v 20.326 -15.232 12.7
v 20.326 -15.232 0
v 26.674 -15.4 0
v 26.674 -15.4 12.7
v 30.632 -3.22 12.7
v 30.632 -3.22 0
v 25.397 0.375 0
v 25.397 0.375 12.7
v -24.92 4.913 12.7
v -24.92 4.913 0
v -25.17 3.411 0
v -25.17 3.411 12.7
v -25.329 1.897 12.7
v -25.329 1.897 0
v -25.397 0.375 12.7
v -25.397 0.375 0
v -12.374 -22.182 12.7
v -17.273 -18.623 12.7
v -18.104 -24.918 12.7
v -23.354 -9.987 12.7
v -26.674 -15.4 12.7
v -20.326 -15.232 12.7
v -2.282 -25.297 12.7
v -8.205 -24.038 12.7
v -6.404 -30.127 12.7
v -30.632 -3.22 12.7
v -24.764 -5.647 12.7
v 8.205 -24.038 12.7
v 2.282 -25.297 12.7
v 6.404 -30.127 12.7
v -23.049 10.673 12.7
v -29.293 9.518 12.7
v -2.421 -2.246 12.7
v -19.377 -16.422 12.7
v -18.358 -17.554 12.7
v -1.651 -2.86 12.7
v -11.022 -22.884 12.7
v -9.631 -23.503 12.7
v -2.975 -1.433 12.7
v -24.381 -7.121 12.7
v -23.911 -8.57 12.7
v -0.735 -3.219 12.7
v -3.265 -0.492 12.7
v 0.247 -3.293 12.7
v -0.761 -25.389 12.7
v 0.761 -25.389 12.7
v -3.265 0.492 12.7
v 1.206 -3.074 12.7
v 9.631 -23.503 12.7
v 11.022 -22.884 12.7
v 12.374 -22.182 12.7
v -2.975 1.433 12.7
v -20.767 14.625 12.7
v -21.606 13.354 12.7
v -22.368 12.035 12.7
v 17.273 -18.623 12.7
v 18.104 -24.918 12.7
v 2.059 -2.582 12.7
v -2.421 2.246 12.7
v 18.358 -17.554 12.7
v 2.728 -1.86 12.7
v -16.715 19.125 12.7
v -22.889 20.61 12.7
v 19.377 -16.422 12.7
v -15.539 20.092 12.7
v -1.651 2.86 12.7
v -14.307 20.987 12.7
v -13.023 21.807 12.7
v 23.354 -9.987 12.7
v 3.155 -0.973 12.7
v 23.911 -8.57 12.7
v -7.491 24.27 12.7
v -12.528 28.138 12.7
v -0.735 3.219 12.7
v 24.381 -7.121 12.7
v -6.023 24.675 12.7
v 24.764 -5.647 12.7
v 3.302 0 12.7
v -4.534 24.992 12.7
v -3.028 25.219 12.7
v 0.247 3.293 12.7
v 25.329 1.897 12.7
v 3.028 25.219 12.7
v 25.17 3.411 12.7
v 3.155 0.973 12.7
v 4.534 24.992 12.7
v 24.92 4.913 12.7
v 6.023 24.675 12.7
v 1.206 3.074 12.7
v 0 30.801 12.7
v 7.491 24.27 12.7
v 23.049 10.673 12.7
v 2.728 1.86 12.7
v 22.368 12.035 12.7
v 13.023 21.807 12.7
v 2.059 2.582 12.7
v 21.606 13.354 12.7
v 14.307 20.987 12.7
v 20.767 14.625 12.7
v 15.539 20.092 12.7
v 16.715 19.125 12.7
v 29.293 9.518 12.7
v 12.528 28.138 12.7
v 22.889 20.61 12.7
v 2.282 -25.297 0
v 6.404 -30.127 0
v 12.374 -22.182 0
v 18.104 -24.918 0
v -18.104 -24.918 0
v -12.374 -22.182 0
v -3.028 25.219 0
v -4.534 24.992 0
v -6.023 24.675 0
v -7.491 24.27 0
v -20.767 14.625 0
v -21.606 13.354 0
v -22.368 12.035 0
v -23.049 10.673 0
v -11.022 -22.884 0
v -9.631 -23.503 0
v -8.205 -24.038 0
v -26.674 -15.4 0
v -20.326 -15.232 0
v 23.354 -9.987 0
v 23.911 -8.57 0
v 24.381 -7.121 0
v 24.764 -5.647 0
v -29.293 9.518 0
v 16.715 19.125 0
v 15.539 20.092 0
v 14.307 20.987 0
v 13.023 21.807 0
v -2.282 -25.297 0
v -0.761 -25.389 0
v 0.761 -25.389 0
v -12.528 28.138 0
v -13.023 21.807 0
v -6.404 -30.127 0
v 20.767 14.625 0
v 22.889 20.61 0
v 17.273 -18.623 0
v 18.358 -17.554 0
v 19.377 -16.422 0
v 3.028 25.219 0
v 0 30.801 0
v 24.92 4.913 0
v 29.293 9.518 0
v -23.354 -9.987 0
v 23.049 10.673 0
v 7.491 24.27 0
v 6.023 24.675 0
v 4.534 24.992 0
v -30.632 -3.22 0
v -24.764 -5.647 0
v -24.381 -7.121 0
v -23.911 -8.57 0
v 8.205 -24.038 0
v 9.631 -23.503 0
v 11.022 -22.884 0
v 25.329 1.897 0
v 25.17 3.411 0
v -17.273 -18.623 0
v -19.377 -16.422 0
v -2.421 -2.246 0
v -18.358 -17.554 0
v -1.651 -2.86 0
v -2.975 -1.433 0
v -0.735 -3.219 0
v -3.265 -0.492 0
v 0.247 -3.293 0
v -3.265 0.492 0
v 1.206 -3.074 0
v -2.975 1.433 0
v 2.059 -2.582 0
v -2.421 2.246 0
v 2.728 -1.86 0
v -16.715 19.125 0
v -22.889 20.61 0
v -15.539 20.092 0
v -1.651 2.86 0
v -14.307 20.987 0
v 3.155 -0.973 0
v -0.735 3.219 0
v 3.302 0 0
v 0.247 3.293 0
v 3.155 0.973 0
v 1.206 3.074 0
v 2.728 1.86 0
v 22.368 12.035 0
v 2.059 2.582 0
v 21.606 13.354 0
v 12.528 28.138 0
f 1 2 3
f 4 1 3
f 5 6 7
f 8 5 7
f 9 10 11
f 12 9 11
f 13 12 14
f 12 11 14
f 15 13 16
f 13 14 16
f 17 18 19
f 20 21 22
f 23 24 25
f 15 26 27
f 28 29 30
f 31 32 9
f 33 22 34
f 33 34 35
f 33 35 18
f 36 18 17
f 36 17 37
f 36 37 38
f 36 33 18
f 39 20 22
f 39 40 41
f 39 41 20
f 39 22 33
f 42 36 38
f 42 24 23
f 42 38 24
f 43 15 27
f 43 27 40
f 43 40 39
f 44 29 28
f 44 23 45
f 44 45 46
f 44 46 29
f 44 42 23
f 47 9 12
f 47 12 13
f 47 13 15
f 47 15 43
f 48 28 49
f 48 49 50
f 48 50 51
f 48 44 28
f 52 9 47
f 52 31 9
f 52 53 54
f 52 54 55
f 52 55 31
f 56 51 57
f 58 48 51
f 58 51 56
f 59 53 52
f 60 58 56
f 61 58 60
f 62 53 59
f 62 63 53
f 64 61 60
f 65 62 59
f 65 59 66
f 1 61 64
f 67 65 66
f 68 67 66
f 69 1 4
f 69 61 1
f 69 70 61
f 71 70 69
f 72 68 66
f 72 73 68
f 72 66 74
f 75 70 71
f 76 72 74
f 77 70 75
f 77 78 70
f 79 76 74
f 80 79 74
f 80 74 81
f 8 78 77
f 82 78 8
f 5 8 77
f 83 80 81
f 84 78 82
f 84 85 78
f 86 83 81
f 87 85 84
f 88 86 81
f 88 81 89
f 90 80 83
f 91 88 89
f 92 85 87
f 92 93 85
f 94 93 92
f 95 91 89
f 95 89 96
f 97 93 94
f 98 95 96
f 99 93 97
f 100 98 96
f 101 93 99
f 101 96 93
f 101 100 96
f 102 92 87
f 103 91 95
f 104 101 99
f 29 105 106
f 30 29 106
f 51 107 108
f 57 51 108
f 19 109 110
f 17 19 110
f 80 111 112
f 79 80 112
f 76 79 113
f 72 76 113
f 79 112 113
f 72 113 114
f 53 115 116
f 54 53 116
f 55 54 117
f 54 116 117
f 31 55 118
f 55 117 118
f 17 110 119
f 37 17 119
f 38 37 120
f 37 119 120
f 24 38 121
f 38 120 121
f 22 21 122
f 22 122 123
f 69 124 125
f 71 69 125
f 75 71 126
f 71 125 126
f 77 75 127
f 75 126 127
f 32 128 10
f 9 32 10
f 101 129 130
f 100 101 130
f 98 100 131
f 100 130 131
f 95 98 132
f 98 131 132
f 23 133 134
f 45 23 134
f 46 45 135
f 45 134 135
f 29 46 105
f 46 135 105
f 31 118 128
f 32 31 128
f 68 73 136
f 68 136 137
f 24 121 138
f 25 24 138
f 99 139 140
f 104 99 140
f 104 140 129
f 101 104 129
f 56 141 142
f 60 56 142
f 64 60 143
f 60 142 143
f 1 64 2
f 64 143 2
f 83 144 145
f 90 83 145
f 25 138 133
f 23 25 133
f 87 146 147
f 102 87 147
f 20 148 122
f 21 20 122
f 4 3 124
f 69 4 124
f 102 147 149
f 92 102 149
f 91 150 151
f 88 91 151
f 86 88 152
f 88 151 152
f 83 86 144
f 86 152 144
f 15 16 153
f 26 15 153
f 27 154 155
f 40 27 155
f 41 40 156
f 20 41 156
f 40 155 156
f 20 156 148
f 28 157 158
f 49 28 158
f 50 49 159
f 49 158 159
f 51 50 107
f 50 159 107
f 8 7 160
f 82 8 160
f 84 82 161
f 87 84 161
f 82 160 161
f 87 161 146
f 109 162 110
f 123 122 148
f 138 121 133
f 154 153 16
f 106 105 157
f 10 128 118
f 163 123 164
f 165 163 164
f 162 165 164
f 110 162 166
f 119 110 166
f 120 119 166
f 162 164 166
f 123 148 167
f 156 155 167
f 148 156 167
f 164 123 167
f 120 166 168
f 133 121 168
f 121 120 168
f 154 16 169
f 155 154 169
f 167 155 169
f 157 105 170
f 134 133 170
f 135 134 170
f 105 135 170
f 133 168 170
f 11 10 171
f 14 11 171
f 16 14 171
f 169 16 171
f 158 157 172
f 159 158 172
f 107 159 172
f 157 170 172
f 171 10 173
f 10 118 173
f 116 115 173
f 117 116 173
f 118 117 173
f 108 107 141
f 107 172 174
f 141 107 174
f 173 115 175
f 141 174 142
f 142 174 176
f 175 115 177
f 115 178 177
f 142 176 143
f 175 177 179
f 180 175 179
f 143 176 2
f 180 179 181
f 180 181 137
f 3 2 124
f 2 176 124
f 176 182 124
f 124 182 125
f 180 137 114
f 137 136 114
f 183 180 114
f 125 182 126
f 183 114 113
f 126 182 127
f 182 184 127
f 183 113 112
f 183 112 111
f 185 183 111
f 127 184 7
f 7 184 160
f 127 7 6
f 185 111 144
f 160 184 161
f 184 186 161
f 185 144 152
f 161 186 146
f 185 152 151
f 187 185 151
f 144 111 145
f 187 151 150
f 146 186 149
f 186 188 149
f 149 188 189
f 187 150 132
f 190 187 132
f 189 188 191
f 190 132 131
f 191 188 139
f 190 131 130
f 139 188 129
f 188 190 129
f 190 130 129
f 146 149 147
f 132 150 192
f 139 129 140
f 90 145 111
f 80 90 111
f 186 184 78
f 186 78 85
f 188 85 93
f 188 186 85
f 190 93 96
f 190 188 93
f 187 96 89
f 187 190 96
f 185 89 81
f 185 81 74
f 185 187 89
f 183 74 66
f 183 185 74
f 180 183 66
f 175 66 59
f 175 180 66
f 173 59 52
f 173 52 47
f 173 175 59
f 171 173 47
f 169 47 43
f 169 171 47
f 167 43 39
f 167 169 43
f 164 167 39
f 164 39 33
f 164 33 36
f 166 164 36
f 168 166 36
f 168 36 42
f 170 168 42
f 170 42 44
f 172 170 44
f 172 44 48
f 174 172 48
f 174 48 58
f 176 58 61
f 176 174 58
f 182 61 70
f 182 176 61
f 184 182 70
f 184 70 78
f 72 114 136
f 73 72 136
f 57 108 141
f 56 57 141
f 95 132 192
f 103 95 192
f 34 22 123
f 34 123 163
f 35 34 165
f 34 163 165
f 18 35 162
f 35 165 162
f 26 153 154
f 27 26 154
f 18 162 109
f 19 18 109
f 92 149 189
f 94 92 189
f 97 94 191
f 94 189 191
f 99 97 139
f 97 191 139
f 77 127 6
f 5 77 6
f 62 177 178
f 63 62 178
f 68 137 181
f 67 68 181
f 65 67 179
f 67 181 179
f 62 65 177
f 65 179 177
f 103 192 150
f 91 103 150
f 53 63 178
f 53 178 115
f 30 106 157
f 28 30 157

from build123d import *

# Parameters (mm, degrees)
F0_R     = 3.302
F1_DEPTH = 12.7


with BuildPart() as f1:
    # F0 (on Top) → F1 (new body)
    with BuildSketch(Plane.XY):
        with BuildLine():
            ThreePointArc((24.764251, -5.647288), (25.240562, -2.84148), (25.4, 0))
            ThreePointArc((25.4, 0), (25.399308, 0.187557), (25.39723, 0.375103))
            ThreePointArc((25.39723, 0.375103), (25.260856, 2.655023), (24.920228, 4.913475))
            ThreePointArc((24.920228, 4.913475), (24.156836, 7.849032), (23.048956, 10.672658))
            ThreePointArc((23.048956, 10.672658), (21.997045, 12.7), (20.767271, 14.624652))
            ThreePointArc((20.767271, 14.624652), (18.875879, 16.995917), (16.715308, 19.124813))
            ThreePointArc((16.715308, 19.124813), (14.929745, 20.549032), (13.023464, 21.807095))
            ThreePointArc((13.023464, 21.807095), (10.331111, 23.204055), (7.491431, 24.270115))
            ThreePointArc((7.491431, 24.270115), (5.280957, 24.844949), (3.027782, 25.218892))
            ThreePointArc((3.027782, 25.218892), (0, 25.4), (-3.027782, 25.218892))
            ThreePointArc((-3.027782, 25.218892), (-5.280957, 24.844949), (-7.491431, 24.270115))
            ThreePointArc((-7.491431, 24.270115), (-10.331111, 23.204055), (-13.023464, 21.807095))
            ThreePointArc((-13.023464, 21.807095), (-14.929745, 20.549032), (-16.715308, 19.124813))
            ThreePointArc((-16.715308, 19.124813), (-18.875879, 16.995917), (-20.767271, 14.624652))
            ThreePointArc((-20.767271, 14.624652), (-21.997045, 12.7), (-23.048956, 10.672658))
            ThreePointArc((-23.048956, 10.672658), (-24.156836, 7.849032), (-24.920228, 4.913475))
            ThreePointArc((-24.920228, 4.913475), (-25.260856, 2.655023), (-25.39723, 0.375103))
            ThreePointArc((-25.39723, 0.375103), (-25.260856, -2.655023), (-24.764251, -5.647288))
            ThreePointArc((-24.764251, -5.647288), (-24.156836, -7.849032), (-23.354093, -9.98731))
            ThreePointArc((-23.354093, -9.98731), (-21.997045, -12.7), (-20.326311, -15.231582))
            ThreePointArc((-20.326311, -15.231582), (-18.875879, -16.995917), (-17.27282, -18.622827))
            ThreePointArc((-17.27282, -18.622827), (-14.929745, -20.549032), (-12.373766, -22.182198))
            ThreePointArc((-12.373766, -22.182198), (-10.331111, -23.204055), (-8.20492, -24.038288))
            ThreePointArc((-8.20492, -24.038288), (-5.280957, -24.844949), (-2.281685, -25.29731))
            ThreePointArc((-2.281685, -25.29731), (0, -25.4), (2.281685, -25.29731))
            ThreePointArc((2.281685, -25.29731), (5.280957, -24.844949), (8.20492, -24.038288))
            ThreePointArc((8.20492, -24.038288), (10.331111, -23.204055), (12.373766, -22.182198))
            ThreePointArc((12.373766, -22.182198), (14.929745, -20.549032), (17.27282, -18.622827))
            ThreePointArc((17.27282, -18.622827), (18.875879, -16.995917), (20.326311, -15.231582))
            ThreePointArc((20.326311, -15.231582), (21.997045, -12.7), (23.354093, -9.98731))
            ThreePointArc((23.354093, -9.98731), (24.156836, -7.849032), (24.764251, -5.647288))
        make_face()
        Circle(F0_R, mode=Mode.SUBTRACT)
        with BuildLine():
            ThreePointArc((25.39723, 0.375103), (25.399308, 0.187557), (25.4, 0))
            ThreePointArc((25.4, 0), (25.240562, -2.84148), (24.764251, -5.647288))
            Line((24.764251, -5.647288), (30.631833, -3.219535))
            Line((30.631833, -3.219535), (25.39723, 0.375103))
        make_face()
        with BuildLine():
            ThreePointArc((23.048956, 10.672658), (24.156836, 7.849032), (24.920228, 4.913475))
            Line((24.920228, 4.913475), (29.293075, 9.517897))
            Line((29.293075, 9.517897), (23.048956, 10.672658))
        make_face()
        with BuildLine():
            Line((26.674069, -15.400281), (23.354093, -9.98731))
            ThreePointArc((23.354093, -9.98731), (21.997045, -12.7), (20.326311, -15.231582))
            Line((20.326311, -15.231582), (26.674069, -15.400281))
        make_face()
        with BuildLine():
            ThreePointArc((16.715308, 19.124813), (18.875879, 16.995917), (20.767271, 14.624652))
            Line((20.767271, 14.624652), (22.889278, 20.609599))
            Line((22.889278, 20.609599), (16.715308, 19.124813))
        make_face()
        with BuildLine():
            Line((18.104116, -24.918178), (17.27282, -18.622827))
            ThreePointArc((17.27282, -18.622827), (14.929745, -20.549032), (12.373766, -22.182198))
            Line((12.373766, -22.182198), (18.104116, -24.918178))
        make_face()
        with BuildLine():
            ThreePointArc((7.491431, 24.270115), (10.331111, 23.204055), (13.023464, 21.807095))
            Line((13.023464, 21.807095), (12.527717, 28.137714))
            Line((12.527717, 28.137714), (7.491431, 24.270115))
        make_face()
        with BuildLine():
            Line((6.403797, -30.127496), (8.20492, -24.038288))
            ThreePointArc((8.20492, -24.038288), (5.280957, -24.844949), (2.281685, -25.29731))
            Line((2.281685, -25.29731), (6.403797, -30.127496))
        make_face()
        with BuildLine():
            ThreePointArc((-3.027782, 25.218892), (0, 25.4), (3.027782, 25.218892))
            Line((3.027782, 25.218892), (0, 30.800562))
            Line((0, 30.800562), (-3.027782, 25.218892))
        make_face()
        with BuildLine():
            Line((-6.403797, -30.127496), (-2.281685, -25.29731))
            ThreePointArc((-2.281685, -25.29731), (-5.280957, -24.844949), (-8.20492, -24.038288))
            Line((-8.20492, -24.038288), (-6.403797, -30.127496))
        make_face()
        with BuildLine():
            ThreePointArc((-13.023464, 21.807095), (-10.331111, 23.204055), (-7.491431, 24.270115))
            Line((-7.491431, 24.270115), (-12.527717, 28.137714))
            Line((-12.527717, 28.137714), (-13.023464, 21.807095))
        make_face()
        with BuildLine():
            Line((-18.104116, -24.918178), (-12.373766, -22.182198))
            ThreePointArc((-12.373766, -22.182198), (-14.929745, -20.549032), (-17.27282, -18.622827))
            Line((-17.27282, -18.622827), (-18.104116, -24.918178))
        make_face()
        with BuildLine():
            ThreePointArc((-20.767271, 14.624652), (-18.875879, 16.995917), (-16.715308, 19.124813))
            Line((-16.715308, 19.124813), (-22.889278, 20.609599))
            Line((-22.889278, 20.609599), (-20.767271, 14.624652))
        make_face()
        with BuildLine():
            Line((-26.674069, -15.400281), (-20.326311, -15.231582))
            ThreePointArc((-20.326311, -15.231582), (-21.997045, -12.7), (-23.354093, -9.98731))
            Line((-23.354093, -9.98731), (-26.674069, -15.400281))
        make_face()
        with BuildLine():
            ThreePointArc((-24.920228, 4.913475), (-24.156836, 7.849032), (-23.048956, 10.672658))
            Line((-23.048956, 10.672658), (-29.293075, 9.517897))
            Line((-29.293075, 9.517897), (-24.920228, 4.913475))
        make_face()
        with BuildLine():
            Line((-30.631833, -3.219535), (-24.764251, -5.647288))
            ThreePointArc((-24.764251, -5.647288), (-25.260856, -2.655023), (-25.39723, 0.375103))
            Line((-25.39723, 0.375103), (-30.631833, -3.219535))
        make_face()
    extrude(amount=F1_DEPTH)


solid = f1.part
